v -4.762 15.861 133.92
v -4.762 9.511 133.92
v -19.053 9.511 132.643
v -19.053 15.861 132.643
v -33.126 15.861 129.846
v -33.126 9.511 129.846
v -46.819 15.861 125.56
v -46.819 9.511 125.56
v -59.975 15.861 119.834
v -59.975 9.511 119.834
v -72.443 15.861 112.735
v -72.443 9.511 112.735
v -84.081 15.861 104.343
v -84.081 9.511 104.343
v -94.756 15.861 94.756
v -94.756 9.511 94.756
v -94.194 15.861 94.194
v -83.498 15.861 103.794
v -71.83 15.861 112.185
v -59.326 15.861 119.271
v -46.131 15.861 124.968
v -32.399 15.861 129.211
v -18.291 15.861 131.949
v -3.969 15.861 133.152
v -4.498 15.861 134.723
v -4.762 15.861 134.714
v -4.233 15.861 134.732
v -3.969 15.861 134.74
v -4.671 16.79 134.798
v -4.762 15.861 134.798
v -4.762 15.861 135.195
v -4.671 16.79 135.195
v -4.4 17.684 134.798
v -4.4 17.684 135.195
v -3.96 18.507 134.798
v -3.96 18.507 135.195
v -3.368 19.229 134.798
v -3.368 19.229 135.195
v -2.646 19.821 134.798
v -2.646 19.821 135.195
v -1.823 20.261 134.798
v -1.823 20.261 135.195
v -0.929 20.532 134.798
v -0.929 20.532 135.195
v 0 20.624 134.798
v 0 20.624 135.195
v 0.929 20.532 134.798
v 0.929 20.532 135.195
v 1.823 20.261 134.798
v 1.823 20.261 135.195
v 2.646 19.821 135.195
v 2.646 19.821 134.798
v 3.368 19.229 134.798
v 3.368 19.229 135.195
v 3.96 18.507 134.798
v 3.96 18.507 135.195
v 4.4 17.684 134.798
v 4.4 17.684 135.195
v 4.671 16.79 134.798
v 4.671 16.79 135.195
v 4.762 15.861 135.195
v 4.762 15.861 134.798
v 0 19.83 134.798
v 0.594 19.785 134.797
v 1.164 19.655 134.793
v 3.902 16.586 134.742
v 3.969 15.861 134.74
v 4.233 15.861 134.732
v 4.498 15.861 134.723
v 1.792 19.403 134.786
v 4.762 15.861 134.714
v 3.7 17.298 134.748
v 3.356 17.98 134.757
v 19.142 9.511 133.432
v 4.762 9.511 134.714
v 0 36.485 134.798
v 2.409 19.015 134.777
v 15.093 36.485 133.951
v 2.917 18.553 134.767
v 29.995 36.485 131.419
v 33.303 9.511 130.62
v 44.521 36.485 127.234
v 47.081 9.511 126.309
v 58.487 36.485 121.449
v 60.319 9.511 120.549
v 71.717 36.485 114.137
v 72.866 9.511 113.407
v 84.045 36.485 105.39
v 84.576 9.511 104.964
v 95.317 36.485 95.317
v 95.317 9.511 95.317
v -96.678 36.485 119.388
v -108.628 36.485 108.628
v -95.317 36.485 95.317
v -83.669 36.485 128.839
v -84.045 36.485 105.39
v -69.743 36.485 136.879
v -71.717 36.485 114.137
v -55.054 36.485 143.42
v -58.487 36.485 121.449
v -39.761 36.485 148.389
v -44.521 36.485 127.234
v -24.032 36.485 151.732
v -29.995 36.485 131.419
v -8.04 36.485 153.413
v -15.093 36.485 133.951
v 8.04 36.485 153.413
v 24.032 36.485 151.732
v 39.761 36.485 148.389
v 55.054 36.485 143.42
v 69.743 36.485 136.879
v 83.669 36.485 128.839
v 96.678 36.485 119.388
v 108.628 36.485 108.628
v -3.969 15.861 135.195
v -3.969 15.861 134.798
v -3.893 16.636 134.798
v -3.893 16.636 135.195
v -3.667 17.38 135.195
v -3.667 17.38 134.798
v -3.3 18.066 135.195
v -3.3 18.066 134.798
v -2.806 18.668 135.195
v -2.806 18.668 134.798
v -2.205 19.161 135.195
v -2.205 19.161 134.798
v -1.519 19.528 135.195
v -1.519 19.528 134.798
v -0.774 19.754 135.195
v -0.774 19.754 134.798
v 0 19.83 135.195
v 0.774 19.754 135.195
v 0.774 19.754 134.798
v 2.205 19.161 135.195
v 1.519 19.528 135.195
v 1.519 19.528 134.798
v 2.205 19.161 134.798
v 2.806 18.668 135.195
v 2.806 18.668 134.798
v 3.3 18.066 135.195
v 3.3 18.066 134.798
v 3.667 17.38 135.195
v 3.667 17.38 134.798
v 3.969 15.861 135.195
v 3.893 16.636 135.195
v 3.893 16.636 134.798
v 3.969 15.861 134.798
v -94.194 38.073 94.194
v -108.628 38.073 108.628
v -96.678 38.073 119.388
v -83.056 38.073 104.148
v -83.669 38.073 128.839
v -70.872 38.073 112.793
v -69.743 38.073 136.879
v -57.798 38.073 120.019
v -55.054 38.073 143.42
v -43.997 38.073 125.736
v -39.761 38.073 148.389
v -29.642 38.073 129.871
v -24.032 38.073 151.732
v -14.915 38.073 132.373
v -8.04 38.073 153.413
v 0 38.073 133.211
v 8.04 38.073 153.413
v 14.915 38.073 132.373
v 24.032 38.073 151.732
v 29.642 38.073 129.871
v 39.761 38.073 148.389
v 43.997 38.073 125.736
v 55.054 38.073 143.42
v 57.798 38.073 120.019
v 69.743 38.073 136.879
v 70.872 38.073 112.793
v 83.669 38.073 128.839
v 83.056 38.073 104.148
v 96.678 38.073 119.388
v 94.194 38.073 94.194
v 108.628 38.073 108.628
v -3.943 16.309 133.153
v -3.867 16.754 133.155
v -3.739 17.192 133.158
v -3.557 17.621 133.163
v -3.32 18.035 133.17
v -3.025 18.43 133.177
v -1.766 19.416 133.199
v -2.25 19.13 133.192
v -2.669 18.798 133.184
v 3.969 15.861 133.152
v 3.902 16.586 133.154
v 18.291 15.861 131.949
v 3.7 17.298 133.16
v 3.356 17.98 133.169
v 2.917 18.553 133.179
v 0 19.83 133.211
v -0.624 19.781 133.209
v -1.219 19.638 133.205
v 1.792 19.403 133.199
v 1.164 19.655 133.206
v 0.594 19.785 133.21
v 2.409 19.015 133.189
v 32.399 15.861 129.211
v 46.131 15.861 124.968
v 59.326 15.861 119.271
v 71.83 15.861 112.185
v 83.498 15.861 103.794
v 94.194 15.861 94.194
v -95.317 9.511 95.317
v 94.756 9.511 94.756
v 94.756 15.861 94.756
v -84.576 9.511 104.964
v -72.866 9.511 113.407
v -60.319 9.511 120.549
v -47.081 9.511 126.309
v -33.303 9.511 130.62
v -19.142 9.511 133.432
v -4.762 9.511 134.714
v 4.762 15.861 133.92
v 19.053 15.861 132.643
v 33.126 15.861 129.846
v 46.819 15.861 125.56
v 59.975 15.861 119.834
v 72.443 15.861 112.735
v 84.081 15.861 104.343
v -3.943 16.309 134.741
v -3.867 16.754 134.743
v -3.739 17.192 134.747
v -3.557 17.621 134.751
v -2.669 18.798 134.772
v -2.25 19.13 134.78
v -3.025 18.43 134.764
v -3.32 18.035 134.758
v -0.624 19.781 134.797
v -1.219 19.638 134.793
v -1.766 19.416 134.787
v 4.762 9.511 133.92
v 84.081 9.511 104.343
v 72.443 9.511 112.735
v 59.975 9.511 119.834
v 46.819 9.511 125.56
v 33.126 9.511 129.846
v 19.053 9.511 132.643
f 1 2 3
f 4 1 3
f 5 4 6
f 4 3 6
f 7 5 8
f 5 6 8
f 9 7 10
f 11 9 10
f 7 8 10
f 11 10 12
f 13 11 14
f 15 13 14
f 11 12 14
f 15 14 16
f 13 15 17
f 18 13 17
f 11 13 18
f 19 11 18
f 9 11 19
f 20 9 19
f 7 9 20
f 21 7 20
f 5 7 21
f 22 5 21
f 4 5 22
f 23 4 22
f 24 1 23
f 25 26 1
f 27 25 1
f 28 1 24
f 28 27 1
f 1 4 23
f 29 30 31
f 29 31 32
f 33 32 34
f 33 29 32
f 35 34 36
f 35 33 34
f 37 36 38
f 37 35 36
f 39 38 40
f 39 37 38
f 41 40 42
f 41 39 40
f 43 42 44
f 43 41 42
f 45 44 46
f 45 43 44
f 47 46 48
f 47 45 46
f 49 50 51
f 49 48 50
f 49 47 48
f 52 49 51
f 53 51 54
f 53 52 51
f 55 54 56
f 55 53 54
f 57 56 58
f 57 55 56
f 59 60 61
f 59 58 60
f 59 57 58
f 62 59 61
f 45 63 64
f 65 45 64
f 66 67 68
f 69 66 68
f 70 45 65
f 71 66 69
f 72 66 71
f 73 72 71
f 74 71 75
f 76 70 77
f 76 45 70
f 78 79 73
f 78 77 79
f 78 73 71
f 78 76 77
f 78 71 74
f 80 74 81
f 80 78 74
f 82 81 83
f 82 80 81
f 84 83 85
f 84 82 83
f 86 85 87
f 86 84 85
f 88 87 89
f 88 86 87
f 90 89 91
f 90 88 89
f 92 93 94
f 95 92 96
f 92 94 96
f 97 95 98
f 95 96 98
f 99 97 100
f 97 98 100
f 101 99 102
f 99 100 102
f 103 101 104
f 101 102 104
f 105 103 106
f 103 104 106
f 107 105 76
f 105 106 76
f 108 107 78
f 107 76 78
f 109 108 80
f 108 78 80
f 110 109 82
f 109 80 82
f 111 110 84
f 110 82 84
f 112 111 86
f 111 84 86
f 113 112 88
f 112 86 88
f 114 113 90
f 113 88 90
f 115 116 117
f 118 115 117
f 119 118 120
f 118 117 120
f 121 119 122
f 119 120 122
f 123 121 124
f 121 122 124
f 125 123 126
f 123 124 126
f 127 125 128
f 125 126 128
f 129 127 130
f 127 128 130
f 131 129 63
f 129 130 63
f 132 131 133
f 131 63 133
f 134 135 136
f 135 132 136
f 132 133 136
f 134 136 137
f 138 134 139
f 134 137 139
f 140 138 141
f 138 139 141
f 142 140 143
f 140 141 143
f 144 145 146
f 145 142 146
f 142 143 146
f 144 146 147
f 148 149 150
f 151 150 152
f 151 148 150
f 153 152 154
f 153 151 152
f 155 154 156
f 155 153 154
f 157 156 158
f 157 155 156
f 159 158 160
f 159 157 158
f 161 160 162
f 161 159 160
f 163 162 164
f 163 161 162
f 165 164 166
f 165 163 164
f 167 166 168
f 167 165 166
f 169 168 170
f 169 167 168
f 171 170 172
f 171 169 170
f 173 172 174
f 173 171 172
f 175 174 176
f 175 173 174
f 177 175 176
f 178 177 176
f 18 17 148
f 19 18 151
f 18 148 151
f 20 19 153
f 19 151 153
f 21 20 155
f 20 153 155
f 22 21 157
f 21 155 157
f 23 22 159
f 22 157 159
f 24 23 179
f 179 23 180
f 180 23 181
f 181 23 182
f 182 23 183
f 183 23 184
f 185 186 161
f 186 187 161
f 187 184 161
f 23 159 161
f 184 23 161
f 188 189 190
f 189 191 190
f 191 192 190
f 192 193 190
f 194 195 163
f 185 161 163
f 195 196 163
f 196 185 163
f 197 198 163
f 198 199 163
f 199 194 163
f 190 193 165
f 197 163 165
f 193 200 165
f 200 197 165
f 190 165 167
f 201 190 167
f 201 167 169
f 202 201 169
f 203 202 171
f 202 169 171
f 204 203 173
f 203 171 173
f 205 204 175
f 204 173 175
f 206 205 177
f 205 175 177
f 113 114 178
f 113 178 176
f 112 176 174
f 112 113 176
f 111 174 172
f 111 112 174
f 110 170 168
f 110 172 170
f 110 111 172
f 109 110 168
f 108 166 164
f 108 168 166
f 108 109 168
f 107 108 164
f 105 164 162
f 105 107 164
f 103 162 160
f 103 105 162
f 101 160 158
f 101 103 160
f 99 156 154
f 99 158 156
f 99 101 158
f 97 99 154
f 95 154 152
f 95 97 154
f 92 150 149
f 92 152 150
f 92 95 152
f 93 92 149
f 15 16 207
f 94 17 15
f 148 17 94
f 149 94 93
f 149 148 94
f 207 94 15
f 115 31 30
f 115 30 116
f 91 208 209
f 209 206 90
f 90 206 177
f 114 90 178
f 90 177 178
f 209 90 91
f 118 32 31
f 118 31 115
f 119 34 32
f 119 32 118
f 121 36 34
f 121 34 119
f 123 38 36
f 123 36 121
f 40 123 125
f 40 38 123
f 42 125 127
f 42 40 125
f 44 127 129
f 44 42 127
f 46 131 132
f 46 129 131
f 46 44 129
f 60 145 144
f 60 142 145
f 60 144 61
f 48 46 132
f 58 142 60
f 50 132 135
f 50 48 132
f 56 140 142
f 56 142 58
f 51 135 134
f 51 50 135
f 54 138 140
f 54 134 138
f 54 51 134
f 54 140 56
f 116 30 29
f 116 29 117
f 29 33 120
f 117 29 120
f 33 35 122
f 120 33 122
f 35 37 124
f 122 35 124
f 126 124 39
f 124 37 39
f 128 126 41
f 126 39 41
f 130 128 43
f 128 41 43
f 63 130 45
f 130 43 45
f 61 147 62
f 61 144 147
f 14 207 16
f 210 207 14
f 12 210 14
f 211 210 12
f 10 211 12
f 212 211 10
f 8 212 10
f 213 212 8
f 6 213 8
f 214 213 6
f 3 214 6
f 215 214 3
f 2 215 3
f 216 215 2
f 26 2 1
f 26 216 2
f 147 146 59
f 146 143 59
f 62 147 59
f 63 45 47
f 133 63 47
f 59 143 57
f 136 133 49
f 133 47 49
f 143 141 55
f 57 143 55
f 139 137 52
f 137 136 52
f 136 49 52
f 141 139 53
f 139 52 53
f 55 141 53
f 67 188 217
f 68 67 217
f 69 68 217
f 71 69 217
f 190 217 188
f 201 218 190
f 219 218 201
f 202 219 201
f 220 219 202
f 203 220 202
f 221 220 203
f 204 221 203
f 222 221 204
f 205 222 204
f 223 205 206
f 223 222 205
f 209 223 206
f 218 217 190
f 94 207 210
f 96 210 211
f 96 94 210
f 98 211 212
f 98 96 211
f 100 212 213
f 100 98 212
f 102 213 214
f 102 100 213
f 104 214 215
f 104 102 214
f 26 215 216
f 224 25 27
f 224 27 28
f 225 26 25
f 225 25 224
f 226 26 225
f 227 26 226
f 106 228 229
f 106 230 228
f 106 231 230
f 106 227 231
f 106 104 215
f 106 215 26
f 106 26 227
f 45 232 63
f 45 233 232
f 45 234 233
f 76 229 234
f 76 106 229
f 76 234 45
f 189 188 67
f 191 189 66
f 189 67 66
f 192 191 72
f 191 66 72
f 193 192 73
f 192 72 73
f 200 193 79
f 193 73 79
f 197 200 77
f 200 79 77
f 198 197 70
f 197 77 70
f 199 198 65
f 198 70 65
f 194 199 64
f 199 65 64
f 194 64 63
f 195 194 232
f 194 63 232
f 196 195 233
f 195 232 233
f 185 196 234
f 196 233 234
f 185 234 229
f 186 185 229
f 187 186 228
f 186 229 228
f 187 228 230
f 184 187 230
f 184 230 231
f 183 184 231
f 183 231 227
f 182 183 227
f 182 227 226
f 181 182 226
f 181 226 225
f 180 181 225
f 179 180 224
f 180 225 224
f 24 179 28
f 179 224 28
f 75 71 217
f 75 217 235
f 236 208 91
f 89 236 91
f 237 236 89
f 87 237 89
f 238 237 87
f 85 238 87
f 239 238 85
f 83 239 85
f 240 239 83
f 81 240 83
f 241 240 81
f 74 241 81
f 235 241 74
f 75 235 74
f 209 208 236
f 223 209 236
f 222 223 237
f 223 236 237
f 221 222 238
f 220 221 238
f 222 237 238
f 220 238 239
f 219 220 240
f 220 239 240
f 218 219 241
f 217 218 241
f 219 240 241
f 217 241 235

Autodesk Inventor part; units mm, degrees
ref_plane "YZ Plane" through (0, 0, 0) normal (1, 0, 0) x (0, 1, 0)
ref_plane "XZ Plane" through (0, 0, 0) normal (0, 1, 0) x (-1, 0, 0)
sketch "Sketch1" plane through (0, 0, 0) normal (1, 0, 0) x (0, 1, 0)
  line L0 (0, 0) -> (28.6807, 0)
  line L1 (0, 133.2109) -> (36.4852, 133.2109)
  line L2 (0, 133.2109) -> (0, 147.2732)
  line L3 (0, 147.2732) -> (1.5875, 147.2732)
  line L4 (1.5875, 134.7984) -> (36.4852, 134.7984)
  line L5 (36.4852, 134.7984) -> (36.4852, 133.2109)
  line L6 (1.5875, 134.7984) -> (1.5875, 147.2732)
  point P0 (15.8613, 134.7984)
  dimension "Lay2Rad" = 133.2109
  dimension "d1" = 14.0623
  dimension "d2" = 1.5875
  dimension "d3" = 36.4852
  dimension "d4" = 1.5875
  dimension "d5" = 1.5875
  dimension "d7" = 14.2738
revolve "Revolution1" add sketch "Sketch1" angle 360 about axis through (0, 0, 0) along (0, 1, 0)
ref_plane "Work Plane1" through (0, 15.8613, 134.7984) normal (0, 0, 1) x (1, 0, 0)
sketch "Sketch2" plane through (0, 15.8613, 134.7984) normal (0, 0, 1) x (1, 0, 0)
  circle A0 centre (0, 0) radius 4.7625
  circle A1 centre (0, 0) radius 3.9688
  point P0 (0, -15.8613)
  dimension "d8" = 9.525
  dimension "d11" = 7.9375
extrude "Extrusion2" cut sketch "Sketch2" against normal through all contours A1
extrude "Extrusion3" add sketch "Sketch2" along normal blind 0.3969
sketch "Sketch3" plane through (0, 36.4852, 0) normal (0, 1, 0) x (1, 0, 0)
  circle A0 centre (0, 0) radius 133.2109
  circle A1 centre (0, 0) radius 133.2109 projected
  circle A2 centre (0, 0) radius 153.6232
  circle A3 centre (0, 0) radius 147.2732 projected
  dimension "d16" = 6.35
extrude "Extrusion4" add sketch "Sketch3" along normal blind 1.5875 contours A2 | A3
sketch "Sketch4" plane through (0, 38.0727, 0) normal (0, 1, 0) x (1, 0, 0)
  line L0 (0, 0) -> (-167.0067, -167.0067)
  line L1 (0, 0) -> (236.1832, 0) construction
  line L2 (0, 0) -> (195.6261, -195.6261)
  line L3 (195.6261, -195.6261) -> (-166.4474, -166.4474)
  line L4 (-166.4474, -166.4474) -> (-176.2344, 211.1551)
  line L5 (-176.2344, 211.1551) -> (203.4461, 189.6497)
  line L6 (203.4461, 189.6497) -> (195.6261, -195.6261)
  dimension "d19" = 135
extrude "Extrusion5" cut sketch "Sketch4" against normal through all contours L0 L4 L5 L6 L2
sketch "Sketch5" plane through (94.1943, 0, 94.1943) normal (0.7071, 0, -0.7071) x (-0.7071, 0, -0.7071)
  line L0 (-6.6801, 15.8613) -> (6.5648, 15.8613)
  line L1 (0, 0) -> (-14.0623, 0) projected
  line L2 (0, 38.0727) -> (0, 0) projected
  line L3 (-0.7937, 15.8613) -> (-0.7937, 22.2113)
  line L4 (-0.7937, 22.2113) -> (0, 22.2113)
  line L5 (-0.7937, 15.8613) -> (-0.7937, 9.5113)
  line L6 (-0.7937, 9.5113) -> (-1.5875, 9.5113)
  line L7 (-1.5875, 1.5875) -> (-1.5875, 36.4852) projected
  line L8 (-1.5875, 9.5113) -> (-19.7753, 9.5113)
  line L9 (-19.7753, 9.5113) -> (-9.8215, -14.1735)
  line L10 (-9.8215, -14.1735) -> (10.1035, -9.9498)
  line L11 (10.1035, -9.9498) -> (6.5648, 15.8613)
  line L12 (0, 22.2113) -> (7.2571, 44.9587)
  line L13 (7.2571, 44.9587) -> (-27.8182, 42.4796)
  line L14 (-27.8182, 42.4796) -> (-19.0035, 23.7483)
  line L15 (133.2109, 0) -> (133.2109, 65.8048)
  line L16 (-14.0623, 1.5875) -> (-1.5875, 1.5875) projected
  line L17 (-19.0035, 23.7483) -> (-6.6801, 15.8613)
  dimension "d23" = 0.7937
  dimension "d24" = 6.35
  dimension "d25" = 6.35
  dimension "d27" = 14.2738
revolve "Revolution2" cut sketch "Sketch5" angle 90 about axis through (0, 0, 0) along (0, -1, 0) contours L0 L11 L10 L9 L8 L6 L5
sketch "Sketch6" plane through (0, 15.8613, 135.1953) normal (0, 0, 1) x (1, 0, 0)
  circle A0 centre (0, 0) radius 4.7625 projected
  line L0 (-4.7625, 0) -> (4.7625, 0)
  line L1 (4.7625, 0) -> (4.7625, -13.1438)
  line L2 (4.7625, -13.1438) -> (-4.7625, -13.1438)
  line L3 (-4.7625, -13.1438) -> (-4.7625, 0)
  point P0 (0, -15.8613)
extrude "Extrusion6" cut sketch "Sketch6" against normal through all contours L1 L2 L3 A0 | A0 L0 picked at (-0.9018, -1.3065)
equation "\"Lay2Rad\" = -2 * SpWall + 0.5 * IBDia"
equation "\"d2\" = Wall"
equation "\"d3\" = d1_1 + BevDriverDia + SpWall + Space + Wall"
equation "\"d4\" = Wall"
equation "\"d5\" = Wall"
equation "\"d7\" = 1.5 * Space + 0.5 * BevDriverDia"
equation "\"d8\" = 2 * Space + AxelDia"
equation "\"d11\" = AxelDia + Space"
equation "\"d14\" = 0.25 * Wall"
equation "\"d17\" = Wall"
equation "\"d23\" = 0.5 * Wall"
equation "\"d27\" = 1.5 * Space + 0.5 * BevDriverDia"
equation "\"SpWall\" = 3.175"
equation "\"IBDia\" = 279.121792"
equation "\"Wall\" = 1.5875"
equation "\"d1_1\" = 6.35"
equation "\"BevDriverDia\" = 23.785175"
equation "\"Space\" = 1.5875"
equation "\"AxelDia\" = 6.35"
properties part number "Layer2_Top_Quarter"
